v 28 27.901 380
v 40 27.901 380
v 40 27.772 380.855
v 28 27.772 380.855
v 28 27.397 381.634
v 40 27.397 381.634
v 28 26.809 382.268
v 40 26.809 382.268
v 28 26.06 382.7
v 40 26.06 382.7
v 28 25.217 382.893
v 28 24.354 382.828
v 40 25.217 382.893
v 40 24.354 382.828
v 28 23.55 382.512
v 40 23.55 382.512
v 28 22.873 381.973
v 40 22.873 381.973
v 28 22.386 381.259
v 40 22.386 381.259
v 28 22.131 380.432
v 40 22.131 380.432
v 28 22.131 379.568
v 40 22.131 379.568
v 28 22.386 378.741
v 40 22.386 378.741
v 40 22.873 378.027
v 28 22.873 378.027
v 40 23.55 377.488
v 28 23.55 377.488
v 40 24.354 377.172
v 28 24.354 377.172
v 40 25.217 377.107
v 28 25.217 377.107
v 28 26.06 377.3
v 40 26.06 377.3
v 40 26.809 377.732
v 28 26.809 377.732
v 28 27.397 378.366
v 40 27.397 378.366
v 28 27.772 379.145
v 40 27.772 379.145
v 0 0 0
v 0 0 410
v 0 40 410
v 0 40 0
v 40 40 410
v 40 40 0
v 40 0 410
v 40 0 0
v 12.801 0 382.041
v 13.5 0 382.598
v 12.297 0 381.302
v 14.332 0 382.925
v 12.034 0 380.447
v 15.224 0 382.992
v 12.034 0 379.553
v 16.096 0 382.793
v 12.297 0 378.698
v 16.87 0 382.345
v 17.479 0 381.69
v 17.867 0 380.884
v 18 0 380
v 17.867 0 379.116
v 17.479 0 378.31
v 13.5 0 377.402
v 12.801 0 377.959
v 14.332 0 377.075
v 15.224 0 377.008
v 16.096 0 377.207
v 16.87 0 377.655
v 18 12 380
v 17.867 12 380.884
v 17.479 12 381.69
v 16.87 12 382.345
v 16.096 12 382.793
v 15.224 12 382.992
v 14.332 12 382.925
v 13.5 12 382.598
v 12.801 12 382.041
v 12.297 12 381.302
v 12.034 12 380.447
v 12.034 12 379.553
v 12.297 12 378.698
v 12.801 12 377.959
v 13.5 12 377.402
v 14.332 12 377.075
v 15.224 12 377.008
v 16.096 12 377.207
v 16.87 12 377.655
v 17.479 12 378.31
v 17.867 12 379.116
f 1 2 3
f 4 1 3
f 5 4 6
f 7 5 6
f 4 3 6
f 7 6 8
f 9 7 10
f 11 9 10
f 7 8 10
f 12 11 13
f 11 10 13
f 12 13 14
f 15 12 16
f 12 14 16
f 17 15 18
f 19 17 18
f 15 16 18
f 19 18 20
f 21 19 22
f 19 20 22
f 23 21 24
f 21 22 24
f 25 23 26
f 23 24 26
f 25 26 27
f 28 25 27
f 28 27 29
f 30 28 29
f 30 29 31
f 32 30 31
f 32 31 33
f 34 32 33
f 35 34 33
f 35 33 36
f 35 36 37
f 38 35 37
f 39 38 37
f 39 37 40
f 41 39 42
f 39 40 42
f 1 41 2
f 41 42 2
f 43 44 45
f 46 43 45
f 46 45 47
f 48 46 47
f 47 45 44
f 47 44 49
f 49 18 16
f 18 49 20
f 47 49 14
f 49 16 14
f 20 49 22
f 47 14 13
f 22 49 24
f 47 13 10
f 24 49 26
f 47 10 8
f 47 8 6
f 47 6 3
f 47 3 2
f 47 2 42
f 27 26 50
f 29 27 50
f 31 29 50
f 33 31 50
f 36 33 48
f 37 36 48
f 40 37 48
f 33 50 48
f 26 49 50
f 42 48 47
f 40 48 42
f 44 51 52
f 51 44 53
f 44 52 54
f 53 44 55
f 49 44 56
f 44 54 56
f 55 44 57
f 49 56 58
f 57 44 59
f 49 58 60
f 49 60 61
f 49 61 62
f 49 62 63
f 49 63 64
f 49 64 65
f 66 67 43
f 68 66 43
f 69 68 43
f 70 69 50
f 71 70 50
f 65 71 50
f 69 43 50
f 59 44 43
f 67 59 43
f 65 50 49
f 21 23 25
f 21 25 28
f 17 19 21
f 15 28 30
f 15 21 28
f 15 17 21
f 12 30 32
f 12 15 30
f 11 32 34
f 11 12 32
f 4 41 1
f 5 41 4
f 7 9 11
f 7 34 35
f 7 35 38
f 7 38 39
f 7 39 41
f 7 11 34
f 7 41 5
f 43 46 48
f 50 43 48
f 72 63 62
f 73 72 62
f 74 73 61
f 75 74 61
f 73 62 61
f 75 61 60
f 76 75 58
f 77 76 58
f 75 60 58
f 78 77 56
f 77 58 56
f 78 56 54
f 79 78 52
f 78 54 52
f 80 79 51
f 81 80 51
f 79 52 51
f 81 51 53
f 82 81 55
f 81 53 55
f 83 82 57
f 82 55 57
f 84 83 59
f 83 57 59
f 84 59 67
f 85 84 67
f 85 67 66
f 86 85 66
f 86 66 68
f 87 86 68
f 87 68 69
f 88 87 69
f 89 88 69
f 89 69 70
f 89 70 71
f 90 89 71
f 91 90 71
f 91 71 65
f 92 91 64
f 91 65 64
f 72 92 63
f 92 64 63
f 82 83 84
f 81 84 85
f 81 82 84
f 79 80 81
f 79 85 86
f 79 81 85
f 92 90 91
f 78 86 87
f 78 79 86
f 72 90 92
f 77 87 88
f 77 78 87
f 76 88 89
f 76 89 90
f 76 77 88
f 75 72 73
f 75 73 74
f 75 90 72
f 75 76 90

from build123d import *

# Parameters (mm, degrees)
F0_W     = 40
F0_H     = 40
F1_DEPTH = 410
F2_R     = 3
F3_DEPTH = 12
F4_R     = 2.900994
F5_DEPTH = 12


with BuildPart() as f1:
    # F0 (on Top) → F1 (new body)
    with BuildSketch(Plane.XY):
        with Locations((20, 20)):
            Rectangle(F0_W, F0_H)
    extrude(amount=F1_DEPTH)

    # F2 (on face) → F3 (cut)
    with BuildSketch(Plane.XZ):
        with Locations((15, 380)):
            Circle(F2_R)
    extrude(amount=-F3_DEPTH, mode=Mode.SUBTRACT)

    # F4 (on face) → F5 (cut)
    with BuildSketch(Plane.YZ.offset(40)):
        with Locations((25, 380)):
            Circle(F4_R)
    extrude(amount=-F5_DEPTH, mode=Mode.SUBTRACT)


solid = f1.part
